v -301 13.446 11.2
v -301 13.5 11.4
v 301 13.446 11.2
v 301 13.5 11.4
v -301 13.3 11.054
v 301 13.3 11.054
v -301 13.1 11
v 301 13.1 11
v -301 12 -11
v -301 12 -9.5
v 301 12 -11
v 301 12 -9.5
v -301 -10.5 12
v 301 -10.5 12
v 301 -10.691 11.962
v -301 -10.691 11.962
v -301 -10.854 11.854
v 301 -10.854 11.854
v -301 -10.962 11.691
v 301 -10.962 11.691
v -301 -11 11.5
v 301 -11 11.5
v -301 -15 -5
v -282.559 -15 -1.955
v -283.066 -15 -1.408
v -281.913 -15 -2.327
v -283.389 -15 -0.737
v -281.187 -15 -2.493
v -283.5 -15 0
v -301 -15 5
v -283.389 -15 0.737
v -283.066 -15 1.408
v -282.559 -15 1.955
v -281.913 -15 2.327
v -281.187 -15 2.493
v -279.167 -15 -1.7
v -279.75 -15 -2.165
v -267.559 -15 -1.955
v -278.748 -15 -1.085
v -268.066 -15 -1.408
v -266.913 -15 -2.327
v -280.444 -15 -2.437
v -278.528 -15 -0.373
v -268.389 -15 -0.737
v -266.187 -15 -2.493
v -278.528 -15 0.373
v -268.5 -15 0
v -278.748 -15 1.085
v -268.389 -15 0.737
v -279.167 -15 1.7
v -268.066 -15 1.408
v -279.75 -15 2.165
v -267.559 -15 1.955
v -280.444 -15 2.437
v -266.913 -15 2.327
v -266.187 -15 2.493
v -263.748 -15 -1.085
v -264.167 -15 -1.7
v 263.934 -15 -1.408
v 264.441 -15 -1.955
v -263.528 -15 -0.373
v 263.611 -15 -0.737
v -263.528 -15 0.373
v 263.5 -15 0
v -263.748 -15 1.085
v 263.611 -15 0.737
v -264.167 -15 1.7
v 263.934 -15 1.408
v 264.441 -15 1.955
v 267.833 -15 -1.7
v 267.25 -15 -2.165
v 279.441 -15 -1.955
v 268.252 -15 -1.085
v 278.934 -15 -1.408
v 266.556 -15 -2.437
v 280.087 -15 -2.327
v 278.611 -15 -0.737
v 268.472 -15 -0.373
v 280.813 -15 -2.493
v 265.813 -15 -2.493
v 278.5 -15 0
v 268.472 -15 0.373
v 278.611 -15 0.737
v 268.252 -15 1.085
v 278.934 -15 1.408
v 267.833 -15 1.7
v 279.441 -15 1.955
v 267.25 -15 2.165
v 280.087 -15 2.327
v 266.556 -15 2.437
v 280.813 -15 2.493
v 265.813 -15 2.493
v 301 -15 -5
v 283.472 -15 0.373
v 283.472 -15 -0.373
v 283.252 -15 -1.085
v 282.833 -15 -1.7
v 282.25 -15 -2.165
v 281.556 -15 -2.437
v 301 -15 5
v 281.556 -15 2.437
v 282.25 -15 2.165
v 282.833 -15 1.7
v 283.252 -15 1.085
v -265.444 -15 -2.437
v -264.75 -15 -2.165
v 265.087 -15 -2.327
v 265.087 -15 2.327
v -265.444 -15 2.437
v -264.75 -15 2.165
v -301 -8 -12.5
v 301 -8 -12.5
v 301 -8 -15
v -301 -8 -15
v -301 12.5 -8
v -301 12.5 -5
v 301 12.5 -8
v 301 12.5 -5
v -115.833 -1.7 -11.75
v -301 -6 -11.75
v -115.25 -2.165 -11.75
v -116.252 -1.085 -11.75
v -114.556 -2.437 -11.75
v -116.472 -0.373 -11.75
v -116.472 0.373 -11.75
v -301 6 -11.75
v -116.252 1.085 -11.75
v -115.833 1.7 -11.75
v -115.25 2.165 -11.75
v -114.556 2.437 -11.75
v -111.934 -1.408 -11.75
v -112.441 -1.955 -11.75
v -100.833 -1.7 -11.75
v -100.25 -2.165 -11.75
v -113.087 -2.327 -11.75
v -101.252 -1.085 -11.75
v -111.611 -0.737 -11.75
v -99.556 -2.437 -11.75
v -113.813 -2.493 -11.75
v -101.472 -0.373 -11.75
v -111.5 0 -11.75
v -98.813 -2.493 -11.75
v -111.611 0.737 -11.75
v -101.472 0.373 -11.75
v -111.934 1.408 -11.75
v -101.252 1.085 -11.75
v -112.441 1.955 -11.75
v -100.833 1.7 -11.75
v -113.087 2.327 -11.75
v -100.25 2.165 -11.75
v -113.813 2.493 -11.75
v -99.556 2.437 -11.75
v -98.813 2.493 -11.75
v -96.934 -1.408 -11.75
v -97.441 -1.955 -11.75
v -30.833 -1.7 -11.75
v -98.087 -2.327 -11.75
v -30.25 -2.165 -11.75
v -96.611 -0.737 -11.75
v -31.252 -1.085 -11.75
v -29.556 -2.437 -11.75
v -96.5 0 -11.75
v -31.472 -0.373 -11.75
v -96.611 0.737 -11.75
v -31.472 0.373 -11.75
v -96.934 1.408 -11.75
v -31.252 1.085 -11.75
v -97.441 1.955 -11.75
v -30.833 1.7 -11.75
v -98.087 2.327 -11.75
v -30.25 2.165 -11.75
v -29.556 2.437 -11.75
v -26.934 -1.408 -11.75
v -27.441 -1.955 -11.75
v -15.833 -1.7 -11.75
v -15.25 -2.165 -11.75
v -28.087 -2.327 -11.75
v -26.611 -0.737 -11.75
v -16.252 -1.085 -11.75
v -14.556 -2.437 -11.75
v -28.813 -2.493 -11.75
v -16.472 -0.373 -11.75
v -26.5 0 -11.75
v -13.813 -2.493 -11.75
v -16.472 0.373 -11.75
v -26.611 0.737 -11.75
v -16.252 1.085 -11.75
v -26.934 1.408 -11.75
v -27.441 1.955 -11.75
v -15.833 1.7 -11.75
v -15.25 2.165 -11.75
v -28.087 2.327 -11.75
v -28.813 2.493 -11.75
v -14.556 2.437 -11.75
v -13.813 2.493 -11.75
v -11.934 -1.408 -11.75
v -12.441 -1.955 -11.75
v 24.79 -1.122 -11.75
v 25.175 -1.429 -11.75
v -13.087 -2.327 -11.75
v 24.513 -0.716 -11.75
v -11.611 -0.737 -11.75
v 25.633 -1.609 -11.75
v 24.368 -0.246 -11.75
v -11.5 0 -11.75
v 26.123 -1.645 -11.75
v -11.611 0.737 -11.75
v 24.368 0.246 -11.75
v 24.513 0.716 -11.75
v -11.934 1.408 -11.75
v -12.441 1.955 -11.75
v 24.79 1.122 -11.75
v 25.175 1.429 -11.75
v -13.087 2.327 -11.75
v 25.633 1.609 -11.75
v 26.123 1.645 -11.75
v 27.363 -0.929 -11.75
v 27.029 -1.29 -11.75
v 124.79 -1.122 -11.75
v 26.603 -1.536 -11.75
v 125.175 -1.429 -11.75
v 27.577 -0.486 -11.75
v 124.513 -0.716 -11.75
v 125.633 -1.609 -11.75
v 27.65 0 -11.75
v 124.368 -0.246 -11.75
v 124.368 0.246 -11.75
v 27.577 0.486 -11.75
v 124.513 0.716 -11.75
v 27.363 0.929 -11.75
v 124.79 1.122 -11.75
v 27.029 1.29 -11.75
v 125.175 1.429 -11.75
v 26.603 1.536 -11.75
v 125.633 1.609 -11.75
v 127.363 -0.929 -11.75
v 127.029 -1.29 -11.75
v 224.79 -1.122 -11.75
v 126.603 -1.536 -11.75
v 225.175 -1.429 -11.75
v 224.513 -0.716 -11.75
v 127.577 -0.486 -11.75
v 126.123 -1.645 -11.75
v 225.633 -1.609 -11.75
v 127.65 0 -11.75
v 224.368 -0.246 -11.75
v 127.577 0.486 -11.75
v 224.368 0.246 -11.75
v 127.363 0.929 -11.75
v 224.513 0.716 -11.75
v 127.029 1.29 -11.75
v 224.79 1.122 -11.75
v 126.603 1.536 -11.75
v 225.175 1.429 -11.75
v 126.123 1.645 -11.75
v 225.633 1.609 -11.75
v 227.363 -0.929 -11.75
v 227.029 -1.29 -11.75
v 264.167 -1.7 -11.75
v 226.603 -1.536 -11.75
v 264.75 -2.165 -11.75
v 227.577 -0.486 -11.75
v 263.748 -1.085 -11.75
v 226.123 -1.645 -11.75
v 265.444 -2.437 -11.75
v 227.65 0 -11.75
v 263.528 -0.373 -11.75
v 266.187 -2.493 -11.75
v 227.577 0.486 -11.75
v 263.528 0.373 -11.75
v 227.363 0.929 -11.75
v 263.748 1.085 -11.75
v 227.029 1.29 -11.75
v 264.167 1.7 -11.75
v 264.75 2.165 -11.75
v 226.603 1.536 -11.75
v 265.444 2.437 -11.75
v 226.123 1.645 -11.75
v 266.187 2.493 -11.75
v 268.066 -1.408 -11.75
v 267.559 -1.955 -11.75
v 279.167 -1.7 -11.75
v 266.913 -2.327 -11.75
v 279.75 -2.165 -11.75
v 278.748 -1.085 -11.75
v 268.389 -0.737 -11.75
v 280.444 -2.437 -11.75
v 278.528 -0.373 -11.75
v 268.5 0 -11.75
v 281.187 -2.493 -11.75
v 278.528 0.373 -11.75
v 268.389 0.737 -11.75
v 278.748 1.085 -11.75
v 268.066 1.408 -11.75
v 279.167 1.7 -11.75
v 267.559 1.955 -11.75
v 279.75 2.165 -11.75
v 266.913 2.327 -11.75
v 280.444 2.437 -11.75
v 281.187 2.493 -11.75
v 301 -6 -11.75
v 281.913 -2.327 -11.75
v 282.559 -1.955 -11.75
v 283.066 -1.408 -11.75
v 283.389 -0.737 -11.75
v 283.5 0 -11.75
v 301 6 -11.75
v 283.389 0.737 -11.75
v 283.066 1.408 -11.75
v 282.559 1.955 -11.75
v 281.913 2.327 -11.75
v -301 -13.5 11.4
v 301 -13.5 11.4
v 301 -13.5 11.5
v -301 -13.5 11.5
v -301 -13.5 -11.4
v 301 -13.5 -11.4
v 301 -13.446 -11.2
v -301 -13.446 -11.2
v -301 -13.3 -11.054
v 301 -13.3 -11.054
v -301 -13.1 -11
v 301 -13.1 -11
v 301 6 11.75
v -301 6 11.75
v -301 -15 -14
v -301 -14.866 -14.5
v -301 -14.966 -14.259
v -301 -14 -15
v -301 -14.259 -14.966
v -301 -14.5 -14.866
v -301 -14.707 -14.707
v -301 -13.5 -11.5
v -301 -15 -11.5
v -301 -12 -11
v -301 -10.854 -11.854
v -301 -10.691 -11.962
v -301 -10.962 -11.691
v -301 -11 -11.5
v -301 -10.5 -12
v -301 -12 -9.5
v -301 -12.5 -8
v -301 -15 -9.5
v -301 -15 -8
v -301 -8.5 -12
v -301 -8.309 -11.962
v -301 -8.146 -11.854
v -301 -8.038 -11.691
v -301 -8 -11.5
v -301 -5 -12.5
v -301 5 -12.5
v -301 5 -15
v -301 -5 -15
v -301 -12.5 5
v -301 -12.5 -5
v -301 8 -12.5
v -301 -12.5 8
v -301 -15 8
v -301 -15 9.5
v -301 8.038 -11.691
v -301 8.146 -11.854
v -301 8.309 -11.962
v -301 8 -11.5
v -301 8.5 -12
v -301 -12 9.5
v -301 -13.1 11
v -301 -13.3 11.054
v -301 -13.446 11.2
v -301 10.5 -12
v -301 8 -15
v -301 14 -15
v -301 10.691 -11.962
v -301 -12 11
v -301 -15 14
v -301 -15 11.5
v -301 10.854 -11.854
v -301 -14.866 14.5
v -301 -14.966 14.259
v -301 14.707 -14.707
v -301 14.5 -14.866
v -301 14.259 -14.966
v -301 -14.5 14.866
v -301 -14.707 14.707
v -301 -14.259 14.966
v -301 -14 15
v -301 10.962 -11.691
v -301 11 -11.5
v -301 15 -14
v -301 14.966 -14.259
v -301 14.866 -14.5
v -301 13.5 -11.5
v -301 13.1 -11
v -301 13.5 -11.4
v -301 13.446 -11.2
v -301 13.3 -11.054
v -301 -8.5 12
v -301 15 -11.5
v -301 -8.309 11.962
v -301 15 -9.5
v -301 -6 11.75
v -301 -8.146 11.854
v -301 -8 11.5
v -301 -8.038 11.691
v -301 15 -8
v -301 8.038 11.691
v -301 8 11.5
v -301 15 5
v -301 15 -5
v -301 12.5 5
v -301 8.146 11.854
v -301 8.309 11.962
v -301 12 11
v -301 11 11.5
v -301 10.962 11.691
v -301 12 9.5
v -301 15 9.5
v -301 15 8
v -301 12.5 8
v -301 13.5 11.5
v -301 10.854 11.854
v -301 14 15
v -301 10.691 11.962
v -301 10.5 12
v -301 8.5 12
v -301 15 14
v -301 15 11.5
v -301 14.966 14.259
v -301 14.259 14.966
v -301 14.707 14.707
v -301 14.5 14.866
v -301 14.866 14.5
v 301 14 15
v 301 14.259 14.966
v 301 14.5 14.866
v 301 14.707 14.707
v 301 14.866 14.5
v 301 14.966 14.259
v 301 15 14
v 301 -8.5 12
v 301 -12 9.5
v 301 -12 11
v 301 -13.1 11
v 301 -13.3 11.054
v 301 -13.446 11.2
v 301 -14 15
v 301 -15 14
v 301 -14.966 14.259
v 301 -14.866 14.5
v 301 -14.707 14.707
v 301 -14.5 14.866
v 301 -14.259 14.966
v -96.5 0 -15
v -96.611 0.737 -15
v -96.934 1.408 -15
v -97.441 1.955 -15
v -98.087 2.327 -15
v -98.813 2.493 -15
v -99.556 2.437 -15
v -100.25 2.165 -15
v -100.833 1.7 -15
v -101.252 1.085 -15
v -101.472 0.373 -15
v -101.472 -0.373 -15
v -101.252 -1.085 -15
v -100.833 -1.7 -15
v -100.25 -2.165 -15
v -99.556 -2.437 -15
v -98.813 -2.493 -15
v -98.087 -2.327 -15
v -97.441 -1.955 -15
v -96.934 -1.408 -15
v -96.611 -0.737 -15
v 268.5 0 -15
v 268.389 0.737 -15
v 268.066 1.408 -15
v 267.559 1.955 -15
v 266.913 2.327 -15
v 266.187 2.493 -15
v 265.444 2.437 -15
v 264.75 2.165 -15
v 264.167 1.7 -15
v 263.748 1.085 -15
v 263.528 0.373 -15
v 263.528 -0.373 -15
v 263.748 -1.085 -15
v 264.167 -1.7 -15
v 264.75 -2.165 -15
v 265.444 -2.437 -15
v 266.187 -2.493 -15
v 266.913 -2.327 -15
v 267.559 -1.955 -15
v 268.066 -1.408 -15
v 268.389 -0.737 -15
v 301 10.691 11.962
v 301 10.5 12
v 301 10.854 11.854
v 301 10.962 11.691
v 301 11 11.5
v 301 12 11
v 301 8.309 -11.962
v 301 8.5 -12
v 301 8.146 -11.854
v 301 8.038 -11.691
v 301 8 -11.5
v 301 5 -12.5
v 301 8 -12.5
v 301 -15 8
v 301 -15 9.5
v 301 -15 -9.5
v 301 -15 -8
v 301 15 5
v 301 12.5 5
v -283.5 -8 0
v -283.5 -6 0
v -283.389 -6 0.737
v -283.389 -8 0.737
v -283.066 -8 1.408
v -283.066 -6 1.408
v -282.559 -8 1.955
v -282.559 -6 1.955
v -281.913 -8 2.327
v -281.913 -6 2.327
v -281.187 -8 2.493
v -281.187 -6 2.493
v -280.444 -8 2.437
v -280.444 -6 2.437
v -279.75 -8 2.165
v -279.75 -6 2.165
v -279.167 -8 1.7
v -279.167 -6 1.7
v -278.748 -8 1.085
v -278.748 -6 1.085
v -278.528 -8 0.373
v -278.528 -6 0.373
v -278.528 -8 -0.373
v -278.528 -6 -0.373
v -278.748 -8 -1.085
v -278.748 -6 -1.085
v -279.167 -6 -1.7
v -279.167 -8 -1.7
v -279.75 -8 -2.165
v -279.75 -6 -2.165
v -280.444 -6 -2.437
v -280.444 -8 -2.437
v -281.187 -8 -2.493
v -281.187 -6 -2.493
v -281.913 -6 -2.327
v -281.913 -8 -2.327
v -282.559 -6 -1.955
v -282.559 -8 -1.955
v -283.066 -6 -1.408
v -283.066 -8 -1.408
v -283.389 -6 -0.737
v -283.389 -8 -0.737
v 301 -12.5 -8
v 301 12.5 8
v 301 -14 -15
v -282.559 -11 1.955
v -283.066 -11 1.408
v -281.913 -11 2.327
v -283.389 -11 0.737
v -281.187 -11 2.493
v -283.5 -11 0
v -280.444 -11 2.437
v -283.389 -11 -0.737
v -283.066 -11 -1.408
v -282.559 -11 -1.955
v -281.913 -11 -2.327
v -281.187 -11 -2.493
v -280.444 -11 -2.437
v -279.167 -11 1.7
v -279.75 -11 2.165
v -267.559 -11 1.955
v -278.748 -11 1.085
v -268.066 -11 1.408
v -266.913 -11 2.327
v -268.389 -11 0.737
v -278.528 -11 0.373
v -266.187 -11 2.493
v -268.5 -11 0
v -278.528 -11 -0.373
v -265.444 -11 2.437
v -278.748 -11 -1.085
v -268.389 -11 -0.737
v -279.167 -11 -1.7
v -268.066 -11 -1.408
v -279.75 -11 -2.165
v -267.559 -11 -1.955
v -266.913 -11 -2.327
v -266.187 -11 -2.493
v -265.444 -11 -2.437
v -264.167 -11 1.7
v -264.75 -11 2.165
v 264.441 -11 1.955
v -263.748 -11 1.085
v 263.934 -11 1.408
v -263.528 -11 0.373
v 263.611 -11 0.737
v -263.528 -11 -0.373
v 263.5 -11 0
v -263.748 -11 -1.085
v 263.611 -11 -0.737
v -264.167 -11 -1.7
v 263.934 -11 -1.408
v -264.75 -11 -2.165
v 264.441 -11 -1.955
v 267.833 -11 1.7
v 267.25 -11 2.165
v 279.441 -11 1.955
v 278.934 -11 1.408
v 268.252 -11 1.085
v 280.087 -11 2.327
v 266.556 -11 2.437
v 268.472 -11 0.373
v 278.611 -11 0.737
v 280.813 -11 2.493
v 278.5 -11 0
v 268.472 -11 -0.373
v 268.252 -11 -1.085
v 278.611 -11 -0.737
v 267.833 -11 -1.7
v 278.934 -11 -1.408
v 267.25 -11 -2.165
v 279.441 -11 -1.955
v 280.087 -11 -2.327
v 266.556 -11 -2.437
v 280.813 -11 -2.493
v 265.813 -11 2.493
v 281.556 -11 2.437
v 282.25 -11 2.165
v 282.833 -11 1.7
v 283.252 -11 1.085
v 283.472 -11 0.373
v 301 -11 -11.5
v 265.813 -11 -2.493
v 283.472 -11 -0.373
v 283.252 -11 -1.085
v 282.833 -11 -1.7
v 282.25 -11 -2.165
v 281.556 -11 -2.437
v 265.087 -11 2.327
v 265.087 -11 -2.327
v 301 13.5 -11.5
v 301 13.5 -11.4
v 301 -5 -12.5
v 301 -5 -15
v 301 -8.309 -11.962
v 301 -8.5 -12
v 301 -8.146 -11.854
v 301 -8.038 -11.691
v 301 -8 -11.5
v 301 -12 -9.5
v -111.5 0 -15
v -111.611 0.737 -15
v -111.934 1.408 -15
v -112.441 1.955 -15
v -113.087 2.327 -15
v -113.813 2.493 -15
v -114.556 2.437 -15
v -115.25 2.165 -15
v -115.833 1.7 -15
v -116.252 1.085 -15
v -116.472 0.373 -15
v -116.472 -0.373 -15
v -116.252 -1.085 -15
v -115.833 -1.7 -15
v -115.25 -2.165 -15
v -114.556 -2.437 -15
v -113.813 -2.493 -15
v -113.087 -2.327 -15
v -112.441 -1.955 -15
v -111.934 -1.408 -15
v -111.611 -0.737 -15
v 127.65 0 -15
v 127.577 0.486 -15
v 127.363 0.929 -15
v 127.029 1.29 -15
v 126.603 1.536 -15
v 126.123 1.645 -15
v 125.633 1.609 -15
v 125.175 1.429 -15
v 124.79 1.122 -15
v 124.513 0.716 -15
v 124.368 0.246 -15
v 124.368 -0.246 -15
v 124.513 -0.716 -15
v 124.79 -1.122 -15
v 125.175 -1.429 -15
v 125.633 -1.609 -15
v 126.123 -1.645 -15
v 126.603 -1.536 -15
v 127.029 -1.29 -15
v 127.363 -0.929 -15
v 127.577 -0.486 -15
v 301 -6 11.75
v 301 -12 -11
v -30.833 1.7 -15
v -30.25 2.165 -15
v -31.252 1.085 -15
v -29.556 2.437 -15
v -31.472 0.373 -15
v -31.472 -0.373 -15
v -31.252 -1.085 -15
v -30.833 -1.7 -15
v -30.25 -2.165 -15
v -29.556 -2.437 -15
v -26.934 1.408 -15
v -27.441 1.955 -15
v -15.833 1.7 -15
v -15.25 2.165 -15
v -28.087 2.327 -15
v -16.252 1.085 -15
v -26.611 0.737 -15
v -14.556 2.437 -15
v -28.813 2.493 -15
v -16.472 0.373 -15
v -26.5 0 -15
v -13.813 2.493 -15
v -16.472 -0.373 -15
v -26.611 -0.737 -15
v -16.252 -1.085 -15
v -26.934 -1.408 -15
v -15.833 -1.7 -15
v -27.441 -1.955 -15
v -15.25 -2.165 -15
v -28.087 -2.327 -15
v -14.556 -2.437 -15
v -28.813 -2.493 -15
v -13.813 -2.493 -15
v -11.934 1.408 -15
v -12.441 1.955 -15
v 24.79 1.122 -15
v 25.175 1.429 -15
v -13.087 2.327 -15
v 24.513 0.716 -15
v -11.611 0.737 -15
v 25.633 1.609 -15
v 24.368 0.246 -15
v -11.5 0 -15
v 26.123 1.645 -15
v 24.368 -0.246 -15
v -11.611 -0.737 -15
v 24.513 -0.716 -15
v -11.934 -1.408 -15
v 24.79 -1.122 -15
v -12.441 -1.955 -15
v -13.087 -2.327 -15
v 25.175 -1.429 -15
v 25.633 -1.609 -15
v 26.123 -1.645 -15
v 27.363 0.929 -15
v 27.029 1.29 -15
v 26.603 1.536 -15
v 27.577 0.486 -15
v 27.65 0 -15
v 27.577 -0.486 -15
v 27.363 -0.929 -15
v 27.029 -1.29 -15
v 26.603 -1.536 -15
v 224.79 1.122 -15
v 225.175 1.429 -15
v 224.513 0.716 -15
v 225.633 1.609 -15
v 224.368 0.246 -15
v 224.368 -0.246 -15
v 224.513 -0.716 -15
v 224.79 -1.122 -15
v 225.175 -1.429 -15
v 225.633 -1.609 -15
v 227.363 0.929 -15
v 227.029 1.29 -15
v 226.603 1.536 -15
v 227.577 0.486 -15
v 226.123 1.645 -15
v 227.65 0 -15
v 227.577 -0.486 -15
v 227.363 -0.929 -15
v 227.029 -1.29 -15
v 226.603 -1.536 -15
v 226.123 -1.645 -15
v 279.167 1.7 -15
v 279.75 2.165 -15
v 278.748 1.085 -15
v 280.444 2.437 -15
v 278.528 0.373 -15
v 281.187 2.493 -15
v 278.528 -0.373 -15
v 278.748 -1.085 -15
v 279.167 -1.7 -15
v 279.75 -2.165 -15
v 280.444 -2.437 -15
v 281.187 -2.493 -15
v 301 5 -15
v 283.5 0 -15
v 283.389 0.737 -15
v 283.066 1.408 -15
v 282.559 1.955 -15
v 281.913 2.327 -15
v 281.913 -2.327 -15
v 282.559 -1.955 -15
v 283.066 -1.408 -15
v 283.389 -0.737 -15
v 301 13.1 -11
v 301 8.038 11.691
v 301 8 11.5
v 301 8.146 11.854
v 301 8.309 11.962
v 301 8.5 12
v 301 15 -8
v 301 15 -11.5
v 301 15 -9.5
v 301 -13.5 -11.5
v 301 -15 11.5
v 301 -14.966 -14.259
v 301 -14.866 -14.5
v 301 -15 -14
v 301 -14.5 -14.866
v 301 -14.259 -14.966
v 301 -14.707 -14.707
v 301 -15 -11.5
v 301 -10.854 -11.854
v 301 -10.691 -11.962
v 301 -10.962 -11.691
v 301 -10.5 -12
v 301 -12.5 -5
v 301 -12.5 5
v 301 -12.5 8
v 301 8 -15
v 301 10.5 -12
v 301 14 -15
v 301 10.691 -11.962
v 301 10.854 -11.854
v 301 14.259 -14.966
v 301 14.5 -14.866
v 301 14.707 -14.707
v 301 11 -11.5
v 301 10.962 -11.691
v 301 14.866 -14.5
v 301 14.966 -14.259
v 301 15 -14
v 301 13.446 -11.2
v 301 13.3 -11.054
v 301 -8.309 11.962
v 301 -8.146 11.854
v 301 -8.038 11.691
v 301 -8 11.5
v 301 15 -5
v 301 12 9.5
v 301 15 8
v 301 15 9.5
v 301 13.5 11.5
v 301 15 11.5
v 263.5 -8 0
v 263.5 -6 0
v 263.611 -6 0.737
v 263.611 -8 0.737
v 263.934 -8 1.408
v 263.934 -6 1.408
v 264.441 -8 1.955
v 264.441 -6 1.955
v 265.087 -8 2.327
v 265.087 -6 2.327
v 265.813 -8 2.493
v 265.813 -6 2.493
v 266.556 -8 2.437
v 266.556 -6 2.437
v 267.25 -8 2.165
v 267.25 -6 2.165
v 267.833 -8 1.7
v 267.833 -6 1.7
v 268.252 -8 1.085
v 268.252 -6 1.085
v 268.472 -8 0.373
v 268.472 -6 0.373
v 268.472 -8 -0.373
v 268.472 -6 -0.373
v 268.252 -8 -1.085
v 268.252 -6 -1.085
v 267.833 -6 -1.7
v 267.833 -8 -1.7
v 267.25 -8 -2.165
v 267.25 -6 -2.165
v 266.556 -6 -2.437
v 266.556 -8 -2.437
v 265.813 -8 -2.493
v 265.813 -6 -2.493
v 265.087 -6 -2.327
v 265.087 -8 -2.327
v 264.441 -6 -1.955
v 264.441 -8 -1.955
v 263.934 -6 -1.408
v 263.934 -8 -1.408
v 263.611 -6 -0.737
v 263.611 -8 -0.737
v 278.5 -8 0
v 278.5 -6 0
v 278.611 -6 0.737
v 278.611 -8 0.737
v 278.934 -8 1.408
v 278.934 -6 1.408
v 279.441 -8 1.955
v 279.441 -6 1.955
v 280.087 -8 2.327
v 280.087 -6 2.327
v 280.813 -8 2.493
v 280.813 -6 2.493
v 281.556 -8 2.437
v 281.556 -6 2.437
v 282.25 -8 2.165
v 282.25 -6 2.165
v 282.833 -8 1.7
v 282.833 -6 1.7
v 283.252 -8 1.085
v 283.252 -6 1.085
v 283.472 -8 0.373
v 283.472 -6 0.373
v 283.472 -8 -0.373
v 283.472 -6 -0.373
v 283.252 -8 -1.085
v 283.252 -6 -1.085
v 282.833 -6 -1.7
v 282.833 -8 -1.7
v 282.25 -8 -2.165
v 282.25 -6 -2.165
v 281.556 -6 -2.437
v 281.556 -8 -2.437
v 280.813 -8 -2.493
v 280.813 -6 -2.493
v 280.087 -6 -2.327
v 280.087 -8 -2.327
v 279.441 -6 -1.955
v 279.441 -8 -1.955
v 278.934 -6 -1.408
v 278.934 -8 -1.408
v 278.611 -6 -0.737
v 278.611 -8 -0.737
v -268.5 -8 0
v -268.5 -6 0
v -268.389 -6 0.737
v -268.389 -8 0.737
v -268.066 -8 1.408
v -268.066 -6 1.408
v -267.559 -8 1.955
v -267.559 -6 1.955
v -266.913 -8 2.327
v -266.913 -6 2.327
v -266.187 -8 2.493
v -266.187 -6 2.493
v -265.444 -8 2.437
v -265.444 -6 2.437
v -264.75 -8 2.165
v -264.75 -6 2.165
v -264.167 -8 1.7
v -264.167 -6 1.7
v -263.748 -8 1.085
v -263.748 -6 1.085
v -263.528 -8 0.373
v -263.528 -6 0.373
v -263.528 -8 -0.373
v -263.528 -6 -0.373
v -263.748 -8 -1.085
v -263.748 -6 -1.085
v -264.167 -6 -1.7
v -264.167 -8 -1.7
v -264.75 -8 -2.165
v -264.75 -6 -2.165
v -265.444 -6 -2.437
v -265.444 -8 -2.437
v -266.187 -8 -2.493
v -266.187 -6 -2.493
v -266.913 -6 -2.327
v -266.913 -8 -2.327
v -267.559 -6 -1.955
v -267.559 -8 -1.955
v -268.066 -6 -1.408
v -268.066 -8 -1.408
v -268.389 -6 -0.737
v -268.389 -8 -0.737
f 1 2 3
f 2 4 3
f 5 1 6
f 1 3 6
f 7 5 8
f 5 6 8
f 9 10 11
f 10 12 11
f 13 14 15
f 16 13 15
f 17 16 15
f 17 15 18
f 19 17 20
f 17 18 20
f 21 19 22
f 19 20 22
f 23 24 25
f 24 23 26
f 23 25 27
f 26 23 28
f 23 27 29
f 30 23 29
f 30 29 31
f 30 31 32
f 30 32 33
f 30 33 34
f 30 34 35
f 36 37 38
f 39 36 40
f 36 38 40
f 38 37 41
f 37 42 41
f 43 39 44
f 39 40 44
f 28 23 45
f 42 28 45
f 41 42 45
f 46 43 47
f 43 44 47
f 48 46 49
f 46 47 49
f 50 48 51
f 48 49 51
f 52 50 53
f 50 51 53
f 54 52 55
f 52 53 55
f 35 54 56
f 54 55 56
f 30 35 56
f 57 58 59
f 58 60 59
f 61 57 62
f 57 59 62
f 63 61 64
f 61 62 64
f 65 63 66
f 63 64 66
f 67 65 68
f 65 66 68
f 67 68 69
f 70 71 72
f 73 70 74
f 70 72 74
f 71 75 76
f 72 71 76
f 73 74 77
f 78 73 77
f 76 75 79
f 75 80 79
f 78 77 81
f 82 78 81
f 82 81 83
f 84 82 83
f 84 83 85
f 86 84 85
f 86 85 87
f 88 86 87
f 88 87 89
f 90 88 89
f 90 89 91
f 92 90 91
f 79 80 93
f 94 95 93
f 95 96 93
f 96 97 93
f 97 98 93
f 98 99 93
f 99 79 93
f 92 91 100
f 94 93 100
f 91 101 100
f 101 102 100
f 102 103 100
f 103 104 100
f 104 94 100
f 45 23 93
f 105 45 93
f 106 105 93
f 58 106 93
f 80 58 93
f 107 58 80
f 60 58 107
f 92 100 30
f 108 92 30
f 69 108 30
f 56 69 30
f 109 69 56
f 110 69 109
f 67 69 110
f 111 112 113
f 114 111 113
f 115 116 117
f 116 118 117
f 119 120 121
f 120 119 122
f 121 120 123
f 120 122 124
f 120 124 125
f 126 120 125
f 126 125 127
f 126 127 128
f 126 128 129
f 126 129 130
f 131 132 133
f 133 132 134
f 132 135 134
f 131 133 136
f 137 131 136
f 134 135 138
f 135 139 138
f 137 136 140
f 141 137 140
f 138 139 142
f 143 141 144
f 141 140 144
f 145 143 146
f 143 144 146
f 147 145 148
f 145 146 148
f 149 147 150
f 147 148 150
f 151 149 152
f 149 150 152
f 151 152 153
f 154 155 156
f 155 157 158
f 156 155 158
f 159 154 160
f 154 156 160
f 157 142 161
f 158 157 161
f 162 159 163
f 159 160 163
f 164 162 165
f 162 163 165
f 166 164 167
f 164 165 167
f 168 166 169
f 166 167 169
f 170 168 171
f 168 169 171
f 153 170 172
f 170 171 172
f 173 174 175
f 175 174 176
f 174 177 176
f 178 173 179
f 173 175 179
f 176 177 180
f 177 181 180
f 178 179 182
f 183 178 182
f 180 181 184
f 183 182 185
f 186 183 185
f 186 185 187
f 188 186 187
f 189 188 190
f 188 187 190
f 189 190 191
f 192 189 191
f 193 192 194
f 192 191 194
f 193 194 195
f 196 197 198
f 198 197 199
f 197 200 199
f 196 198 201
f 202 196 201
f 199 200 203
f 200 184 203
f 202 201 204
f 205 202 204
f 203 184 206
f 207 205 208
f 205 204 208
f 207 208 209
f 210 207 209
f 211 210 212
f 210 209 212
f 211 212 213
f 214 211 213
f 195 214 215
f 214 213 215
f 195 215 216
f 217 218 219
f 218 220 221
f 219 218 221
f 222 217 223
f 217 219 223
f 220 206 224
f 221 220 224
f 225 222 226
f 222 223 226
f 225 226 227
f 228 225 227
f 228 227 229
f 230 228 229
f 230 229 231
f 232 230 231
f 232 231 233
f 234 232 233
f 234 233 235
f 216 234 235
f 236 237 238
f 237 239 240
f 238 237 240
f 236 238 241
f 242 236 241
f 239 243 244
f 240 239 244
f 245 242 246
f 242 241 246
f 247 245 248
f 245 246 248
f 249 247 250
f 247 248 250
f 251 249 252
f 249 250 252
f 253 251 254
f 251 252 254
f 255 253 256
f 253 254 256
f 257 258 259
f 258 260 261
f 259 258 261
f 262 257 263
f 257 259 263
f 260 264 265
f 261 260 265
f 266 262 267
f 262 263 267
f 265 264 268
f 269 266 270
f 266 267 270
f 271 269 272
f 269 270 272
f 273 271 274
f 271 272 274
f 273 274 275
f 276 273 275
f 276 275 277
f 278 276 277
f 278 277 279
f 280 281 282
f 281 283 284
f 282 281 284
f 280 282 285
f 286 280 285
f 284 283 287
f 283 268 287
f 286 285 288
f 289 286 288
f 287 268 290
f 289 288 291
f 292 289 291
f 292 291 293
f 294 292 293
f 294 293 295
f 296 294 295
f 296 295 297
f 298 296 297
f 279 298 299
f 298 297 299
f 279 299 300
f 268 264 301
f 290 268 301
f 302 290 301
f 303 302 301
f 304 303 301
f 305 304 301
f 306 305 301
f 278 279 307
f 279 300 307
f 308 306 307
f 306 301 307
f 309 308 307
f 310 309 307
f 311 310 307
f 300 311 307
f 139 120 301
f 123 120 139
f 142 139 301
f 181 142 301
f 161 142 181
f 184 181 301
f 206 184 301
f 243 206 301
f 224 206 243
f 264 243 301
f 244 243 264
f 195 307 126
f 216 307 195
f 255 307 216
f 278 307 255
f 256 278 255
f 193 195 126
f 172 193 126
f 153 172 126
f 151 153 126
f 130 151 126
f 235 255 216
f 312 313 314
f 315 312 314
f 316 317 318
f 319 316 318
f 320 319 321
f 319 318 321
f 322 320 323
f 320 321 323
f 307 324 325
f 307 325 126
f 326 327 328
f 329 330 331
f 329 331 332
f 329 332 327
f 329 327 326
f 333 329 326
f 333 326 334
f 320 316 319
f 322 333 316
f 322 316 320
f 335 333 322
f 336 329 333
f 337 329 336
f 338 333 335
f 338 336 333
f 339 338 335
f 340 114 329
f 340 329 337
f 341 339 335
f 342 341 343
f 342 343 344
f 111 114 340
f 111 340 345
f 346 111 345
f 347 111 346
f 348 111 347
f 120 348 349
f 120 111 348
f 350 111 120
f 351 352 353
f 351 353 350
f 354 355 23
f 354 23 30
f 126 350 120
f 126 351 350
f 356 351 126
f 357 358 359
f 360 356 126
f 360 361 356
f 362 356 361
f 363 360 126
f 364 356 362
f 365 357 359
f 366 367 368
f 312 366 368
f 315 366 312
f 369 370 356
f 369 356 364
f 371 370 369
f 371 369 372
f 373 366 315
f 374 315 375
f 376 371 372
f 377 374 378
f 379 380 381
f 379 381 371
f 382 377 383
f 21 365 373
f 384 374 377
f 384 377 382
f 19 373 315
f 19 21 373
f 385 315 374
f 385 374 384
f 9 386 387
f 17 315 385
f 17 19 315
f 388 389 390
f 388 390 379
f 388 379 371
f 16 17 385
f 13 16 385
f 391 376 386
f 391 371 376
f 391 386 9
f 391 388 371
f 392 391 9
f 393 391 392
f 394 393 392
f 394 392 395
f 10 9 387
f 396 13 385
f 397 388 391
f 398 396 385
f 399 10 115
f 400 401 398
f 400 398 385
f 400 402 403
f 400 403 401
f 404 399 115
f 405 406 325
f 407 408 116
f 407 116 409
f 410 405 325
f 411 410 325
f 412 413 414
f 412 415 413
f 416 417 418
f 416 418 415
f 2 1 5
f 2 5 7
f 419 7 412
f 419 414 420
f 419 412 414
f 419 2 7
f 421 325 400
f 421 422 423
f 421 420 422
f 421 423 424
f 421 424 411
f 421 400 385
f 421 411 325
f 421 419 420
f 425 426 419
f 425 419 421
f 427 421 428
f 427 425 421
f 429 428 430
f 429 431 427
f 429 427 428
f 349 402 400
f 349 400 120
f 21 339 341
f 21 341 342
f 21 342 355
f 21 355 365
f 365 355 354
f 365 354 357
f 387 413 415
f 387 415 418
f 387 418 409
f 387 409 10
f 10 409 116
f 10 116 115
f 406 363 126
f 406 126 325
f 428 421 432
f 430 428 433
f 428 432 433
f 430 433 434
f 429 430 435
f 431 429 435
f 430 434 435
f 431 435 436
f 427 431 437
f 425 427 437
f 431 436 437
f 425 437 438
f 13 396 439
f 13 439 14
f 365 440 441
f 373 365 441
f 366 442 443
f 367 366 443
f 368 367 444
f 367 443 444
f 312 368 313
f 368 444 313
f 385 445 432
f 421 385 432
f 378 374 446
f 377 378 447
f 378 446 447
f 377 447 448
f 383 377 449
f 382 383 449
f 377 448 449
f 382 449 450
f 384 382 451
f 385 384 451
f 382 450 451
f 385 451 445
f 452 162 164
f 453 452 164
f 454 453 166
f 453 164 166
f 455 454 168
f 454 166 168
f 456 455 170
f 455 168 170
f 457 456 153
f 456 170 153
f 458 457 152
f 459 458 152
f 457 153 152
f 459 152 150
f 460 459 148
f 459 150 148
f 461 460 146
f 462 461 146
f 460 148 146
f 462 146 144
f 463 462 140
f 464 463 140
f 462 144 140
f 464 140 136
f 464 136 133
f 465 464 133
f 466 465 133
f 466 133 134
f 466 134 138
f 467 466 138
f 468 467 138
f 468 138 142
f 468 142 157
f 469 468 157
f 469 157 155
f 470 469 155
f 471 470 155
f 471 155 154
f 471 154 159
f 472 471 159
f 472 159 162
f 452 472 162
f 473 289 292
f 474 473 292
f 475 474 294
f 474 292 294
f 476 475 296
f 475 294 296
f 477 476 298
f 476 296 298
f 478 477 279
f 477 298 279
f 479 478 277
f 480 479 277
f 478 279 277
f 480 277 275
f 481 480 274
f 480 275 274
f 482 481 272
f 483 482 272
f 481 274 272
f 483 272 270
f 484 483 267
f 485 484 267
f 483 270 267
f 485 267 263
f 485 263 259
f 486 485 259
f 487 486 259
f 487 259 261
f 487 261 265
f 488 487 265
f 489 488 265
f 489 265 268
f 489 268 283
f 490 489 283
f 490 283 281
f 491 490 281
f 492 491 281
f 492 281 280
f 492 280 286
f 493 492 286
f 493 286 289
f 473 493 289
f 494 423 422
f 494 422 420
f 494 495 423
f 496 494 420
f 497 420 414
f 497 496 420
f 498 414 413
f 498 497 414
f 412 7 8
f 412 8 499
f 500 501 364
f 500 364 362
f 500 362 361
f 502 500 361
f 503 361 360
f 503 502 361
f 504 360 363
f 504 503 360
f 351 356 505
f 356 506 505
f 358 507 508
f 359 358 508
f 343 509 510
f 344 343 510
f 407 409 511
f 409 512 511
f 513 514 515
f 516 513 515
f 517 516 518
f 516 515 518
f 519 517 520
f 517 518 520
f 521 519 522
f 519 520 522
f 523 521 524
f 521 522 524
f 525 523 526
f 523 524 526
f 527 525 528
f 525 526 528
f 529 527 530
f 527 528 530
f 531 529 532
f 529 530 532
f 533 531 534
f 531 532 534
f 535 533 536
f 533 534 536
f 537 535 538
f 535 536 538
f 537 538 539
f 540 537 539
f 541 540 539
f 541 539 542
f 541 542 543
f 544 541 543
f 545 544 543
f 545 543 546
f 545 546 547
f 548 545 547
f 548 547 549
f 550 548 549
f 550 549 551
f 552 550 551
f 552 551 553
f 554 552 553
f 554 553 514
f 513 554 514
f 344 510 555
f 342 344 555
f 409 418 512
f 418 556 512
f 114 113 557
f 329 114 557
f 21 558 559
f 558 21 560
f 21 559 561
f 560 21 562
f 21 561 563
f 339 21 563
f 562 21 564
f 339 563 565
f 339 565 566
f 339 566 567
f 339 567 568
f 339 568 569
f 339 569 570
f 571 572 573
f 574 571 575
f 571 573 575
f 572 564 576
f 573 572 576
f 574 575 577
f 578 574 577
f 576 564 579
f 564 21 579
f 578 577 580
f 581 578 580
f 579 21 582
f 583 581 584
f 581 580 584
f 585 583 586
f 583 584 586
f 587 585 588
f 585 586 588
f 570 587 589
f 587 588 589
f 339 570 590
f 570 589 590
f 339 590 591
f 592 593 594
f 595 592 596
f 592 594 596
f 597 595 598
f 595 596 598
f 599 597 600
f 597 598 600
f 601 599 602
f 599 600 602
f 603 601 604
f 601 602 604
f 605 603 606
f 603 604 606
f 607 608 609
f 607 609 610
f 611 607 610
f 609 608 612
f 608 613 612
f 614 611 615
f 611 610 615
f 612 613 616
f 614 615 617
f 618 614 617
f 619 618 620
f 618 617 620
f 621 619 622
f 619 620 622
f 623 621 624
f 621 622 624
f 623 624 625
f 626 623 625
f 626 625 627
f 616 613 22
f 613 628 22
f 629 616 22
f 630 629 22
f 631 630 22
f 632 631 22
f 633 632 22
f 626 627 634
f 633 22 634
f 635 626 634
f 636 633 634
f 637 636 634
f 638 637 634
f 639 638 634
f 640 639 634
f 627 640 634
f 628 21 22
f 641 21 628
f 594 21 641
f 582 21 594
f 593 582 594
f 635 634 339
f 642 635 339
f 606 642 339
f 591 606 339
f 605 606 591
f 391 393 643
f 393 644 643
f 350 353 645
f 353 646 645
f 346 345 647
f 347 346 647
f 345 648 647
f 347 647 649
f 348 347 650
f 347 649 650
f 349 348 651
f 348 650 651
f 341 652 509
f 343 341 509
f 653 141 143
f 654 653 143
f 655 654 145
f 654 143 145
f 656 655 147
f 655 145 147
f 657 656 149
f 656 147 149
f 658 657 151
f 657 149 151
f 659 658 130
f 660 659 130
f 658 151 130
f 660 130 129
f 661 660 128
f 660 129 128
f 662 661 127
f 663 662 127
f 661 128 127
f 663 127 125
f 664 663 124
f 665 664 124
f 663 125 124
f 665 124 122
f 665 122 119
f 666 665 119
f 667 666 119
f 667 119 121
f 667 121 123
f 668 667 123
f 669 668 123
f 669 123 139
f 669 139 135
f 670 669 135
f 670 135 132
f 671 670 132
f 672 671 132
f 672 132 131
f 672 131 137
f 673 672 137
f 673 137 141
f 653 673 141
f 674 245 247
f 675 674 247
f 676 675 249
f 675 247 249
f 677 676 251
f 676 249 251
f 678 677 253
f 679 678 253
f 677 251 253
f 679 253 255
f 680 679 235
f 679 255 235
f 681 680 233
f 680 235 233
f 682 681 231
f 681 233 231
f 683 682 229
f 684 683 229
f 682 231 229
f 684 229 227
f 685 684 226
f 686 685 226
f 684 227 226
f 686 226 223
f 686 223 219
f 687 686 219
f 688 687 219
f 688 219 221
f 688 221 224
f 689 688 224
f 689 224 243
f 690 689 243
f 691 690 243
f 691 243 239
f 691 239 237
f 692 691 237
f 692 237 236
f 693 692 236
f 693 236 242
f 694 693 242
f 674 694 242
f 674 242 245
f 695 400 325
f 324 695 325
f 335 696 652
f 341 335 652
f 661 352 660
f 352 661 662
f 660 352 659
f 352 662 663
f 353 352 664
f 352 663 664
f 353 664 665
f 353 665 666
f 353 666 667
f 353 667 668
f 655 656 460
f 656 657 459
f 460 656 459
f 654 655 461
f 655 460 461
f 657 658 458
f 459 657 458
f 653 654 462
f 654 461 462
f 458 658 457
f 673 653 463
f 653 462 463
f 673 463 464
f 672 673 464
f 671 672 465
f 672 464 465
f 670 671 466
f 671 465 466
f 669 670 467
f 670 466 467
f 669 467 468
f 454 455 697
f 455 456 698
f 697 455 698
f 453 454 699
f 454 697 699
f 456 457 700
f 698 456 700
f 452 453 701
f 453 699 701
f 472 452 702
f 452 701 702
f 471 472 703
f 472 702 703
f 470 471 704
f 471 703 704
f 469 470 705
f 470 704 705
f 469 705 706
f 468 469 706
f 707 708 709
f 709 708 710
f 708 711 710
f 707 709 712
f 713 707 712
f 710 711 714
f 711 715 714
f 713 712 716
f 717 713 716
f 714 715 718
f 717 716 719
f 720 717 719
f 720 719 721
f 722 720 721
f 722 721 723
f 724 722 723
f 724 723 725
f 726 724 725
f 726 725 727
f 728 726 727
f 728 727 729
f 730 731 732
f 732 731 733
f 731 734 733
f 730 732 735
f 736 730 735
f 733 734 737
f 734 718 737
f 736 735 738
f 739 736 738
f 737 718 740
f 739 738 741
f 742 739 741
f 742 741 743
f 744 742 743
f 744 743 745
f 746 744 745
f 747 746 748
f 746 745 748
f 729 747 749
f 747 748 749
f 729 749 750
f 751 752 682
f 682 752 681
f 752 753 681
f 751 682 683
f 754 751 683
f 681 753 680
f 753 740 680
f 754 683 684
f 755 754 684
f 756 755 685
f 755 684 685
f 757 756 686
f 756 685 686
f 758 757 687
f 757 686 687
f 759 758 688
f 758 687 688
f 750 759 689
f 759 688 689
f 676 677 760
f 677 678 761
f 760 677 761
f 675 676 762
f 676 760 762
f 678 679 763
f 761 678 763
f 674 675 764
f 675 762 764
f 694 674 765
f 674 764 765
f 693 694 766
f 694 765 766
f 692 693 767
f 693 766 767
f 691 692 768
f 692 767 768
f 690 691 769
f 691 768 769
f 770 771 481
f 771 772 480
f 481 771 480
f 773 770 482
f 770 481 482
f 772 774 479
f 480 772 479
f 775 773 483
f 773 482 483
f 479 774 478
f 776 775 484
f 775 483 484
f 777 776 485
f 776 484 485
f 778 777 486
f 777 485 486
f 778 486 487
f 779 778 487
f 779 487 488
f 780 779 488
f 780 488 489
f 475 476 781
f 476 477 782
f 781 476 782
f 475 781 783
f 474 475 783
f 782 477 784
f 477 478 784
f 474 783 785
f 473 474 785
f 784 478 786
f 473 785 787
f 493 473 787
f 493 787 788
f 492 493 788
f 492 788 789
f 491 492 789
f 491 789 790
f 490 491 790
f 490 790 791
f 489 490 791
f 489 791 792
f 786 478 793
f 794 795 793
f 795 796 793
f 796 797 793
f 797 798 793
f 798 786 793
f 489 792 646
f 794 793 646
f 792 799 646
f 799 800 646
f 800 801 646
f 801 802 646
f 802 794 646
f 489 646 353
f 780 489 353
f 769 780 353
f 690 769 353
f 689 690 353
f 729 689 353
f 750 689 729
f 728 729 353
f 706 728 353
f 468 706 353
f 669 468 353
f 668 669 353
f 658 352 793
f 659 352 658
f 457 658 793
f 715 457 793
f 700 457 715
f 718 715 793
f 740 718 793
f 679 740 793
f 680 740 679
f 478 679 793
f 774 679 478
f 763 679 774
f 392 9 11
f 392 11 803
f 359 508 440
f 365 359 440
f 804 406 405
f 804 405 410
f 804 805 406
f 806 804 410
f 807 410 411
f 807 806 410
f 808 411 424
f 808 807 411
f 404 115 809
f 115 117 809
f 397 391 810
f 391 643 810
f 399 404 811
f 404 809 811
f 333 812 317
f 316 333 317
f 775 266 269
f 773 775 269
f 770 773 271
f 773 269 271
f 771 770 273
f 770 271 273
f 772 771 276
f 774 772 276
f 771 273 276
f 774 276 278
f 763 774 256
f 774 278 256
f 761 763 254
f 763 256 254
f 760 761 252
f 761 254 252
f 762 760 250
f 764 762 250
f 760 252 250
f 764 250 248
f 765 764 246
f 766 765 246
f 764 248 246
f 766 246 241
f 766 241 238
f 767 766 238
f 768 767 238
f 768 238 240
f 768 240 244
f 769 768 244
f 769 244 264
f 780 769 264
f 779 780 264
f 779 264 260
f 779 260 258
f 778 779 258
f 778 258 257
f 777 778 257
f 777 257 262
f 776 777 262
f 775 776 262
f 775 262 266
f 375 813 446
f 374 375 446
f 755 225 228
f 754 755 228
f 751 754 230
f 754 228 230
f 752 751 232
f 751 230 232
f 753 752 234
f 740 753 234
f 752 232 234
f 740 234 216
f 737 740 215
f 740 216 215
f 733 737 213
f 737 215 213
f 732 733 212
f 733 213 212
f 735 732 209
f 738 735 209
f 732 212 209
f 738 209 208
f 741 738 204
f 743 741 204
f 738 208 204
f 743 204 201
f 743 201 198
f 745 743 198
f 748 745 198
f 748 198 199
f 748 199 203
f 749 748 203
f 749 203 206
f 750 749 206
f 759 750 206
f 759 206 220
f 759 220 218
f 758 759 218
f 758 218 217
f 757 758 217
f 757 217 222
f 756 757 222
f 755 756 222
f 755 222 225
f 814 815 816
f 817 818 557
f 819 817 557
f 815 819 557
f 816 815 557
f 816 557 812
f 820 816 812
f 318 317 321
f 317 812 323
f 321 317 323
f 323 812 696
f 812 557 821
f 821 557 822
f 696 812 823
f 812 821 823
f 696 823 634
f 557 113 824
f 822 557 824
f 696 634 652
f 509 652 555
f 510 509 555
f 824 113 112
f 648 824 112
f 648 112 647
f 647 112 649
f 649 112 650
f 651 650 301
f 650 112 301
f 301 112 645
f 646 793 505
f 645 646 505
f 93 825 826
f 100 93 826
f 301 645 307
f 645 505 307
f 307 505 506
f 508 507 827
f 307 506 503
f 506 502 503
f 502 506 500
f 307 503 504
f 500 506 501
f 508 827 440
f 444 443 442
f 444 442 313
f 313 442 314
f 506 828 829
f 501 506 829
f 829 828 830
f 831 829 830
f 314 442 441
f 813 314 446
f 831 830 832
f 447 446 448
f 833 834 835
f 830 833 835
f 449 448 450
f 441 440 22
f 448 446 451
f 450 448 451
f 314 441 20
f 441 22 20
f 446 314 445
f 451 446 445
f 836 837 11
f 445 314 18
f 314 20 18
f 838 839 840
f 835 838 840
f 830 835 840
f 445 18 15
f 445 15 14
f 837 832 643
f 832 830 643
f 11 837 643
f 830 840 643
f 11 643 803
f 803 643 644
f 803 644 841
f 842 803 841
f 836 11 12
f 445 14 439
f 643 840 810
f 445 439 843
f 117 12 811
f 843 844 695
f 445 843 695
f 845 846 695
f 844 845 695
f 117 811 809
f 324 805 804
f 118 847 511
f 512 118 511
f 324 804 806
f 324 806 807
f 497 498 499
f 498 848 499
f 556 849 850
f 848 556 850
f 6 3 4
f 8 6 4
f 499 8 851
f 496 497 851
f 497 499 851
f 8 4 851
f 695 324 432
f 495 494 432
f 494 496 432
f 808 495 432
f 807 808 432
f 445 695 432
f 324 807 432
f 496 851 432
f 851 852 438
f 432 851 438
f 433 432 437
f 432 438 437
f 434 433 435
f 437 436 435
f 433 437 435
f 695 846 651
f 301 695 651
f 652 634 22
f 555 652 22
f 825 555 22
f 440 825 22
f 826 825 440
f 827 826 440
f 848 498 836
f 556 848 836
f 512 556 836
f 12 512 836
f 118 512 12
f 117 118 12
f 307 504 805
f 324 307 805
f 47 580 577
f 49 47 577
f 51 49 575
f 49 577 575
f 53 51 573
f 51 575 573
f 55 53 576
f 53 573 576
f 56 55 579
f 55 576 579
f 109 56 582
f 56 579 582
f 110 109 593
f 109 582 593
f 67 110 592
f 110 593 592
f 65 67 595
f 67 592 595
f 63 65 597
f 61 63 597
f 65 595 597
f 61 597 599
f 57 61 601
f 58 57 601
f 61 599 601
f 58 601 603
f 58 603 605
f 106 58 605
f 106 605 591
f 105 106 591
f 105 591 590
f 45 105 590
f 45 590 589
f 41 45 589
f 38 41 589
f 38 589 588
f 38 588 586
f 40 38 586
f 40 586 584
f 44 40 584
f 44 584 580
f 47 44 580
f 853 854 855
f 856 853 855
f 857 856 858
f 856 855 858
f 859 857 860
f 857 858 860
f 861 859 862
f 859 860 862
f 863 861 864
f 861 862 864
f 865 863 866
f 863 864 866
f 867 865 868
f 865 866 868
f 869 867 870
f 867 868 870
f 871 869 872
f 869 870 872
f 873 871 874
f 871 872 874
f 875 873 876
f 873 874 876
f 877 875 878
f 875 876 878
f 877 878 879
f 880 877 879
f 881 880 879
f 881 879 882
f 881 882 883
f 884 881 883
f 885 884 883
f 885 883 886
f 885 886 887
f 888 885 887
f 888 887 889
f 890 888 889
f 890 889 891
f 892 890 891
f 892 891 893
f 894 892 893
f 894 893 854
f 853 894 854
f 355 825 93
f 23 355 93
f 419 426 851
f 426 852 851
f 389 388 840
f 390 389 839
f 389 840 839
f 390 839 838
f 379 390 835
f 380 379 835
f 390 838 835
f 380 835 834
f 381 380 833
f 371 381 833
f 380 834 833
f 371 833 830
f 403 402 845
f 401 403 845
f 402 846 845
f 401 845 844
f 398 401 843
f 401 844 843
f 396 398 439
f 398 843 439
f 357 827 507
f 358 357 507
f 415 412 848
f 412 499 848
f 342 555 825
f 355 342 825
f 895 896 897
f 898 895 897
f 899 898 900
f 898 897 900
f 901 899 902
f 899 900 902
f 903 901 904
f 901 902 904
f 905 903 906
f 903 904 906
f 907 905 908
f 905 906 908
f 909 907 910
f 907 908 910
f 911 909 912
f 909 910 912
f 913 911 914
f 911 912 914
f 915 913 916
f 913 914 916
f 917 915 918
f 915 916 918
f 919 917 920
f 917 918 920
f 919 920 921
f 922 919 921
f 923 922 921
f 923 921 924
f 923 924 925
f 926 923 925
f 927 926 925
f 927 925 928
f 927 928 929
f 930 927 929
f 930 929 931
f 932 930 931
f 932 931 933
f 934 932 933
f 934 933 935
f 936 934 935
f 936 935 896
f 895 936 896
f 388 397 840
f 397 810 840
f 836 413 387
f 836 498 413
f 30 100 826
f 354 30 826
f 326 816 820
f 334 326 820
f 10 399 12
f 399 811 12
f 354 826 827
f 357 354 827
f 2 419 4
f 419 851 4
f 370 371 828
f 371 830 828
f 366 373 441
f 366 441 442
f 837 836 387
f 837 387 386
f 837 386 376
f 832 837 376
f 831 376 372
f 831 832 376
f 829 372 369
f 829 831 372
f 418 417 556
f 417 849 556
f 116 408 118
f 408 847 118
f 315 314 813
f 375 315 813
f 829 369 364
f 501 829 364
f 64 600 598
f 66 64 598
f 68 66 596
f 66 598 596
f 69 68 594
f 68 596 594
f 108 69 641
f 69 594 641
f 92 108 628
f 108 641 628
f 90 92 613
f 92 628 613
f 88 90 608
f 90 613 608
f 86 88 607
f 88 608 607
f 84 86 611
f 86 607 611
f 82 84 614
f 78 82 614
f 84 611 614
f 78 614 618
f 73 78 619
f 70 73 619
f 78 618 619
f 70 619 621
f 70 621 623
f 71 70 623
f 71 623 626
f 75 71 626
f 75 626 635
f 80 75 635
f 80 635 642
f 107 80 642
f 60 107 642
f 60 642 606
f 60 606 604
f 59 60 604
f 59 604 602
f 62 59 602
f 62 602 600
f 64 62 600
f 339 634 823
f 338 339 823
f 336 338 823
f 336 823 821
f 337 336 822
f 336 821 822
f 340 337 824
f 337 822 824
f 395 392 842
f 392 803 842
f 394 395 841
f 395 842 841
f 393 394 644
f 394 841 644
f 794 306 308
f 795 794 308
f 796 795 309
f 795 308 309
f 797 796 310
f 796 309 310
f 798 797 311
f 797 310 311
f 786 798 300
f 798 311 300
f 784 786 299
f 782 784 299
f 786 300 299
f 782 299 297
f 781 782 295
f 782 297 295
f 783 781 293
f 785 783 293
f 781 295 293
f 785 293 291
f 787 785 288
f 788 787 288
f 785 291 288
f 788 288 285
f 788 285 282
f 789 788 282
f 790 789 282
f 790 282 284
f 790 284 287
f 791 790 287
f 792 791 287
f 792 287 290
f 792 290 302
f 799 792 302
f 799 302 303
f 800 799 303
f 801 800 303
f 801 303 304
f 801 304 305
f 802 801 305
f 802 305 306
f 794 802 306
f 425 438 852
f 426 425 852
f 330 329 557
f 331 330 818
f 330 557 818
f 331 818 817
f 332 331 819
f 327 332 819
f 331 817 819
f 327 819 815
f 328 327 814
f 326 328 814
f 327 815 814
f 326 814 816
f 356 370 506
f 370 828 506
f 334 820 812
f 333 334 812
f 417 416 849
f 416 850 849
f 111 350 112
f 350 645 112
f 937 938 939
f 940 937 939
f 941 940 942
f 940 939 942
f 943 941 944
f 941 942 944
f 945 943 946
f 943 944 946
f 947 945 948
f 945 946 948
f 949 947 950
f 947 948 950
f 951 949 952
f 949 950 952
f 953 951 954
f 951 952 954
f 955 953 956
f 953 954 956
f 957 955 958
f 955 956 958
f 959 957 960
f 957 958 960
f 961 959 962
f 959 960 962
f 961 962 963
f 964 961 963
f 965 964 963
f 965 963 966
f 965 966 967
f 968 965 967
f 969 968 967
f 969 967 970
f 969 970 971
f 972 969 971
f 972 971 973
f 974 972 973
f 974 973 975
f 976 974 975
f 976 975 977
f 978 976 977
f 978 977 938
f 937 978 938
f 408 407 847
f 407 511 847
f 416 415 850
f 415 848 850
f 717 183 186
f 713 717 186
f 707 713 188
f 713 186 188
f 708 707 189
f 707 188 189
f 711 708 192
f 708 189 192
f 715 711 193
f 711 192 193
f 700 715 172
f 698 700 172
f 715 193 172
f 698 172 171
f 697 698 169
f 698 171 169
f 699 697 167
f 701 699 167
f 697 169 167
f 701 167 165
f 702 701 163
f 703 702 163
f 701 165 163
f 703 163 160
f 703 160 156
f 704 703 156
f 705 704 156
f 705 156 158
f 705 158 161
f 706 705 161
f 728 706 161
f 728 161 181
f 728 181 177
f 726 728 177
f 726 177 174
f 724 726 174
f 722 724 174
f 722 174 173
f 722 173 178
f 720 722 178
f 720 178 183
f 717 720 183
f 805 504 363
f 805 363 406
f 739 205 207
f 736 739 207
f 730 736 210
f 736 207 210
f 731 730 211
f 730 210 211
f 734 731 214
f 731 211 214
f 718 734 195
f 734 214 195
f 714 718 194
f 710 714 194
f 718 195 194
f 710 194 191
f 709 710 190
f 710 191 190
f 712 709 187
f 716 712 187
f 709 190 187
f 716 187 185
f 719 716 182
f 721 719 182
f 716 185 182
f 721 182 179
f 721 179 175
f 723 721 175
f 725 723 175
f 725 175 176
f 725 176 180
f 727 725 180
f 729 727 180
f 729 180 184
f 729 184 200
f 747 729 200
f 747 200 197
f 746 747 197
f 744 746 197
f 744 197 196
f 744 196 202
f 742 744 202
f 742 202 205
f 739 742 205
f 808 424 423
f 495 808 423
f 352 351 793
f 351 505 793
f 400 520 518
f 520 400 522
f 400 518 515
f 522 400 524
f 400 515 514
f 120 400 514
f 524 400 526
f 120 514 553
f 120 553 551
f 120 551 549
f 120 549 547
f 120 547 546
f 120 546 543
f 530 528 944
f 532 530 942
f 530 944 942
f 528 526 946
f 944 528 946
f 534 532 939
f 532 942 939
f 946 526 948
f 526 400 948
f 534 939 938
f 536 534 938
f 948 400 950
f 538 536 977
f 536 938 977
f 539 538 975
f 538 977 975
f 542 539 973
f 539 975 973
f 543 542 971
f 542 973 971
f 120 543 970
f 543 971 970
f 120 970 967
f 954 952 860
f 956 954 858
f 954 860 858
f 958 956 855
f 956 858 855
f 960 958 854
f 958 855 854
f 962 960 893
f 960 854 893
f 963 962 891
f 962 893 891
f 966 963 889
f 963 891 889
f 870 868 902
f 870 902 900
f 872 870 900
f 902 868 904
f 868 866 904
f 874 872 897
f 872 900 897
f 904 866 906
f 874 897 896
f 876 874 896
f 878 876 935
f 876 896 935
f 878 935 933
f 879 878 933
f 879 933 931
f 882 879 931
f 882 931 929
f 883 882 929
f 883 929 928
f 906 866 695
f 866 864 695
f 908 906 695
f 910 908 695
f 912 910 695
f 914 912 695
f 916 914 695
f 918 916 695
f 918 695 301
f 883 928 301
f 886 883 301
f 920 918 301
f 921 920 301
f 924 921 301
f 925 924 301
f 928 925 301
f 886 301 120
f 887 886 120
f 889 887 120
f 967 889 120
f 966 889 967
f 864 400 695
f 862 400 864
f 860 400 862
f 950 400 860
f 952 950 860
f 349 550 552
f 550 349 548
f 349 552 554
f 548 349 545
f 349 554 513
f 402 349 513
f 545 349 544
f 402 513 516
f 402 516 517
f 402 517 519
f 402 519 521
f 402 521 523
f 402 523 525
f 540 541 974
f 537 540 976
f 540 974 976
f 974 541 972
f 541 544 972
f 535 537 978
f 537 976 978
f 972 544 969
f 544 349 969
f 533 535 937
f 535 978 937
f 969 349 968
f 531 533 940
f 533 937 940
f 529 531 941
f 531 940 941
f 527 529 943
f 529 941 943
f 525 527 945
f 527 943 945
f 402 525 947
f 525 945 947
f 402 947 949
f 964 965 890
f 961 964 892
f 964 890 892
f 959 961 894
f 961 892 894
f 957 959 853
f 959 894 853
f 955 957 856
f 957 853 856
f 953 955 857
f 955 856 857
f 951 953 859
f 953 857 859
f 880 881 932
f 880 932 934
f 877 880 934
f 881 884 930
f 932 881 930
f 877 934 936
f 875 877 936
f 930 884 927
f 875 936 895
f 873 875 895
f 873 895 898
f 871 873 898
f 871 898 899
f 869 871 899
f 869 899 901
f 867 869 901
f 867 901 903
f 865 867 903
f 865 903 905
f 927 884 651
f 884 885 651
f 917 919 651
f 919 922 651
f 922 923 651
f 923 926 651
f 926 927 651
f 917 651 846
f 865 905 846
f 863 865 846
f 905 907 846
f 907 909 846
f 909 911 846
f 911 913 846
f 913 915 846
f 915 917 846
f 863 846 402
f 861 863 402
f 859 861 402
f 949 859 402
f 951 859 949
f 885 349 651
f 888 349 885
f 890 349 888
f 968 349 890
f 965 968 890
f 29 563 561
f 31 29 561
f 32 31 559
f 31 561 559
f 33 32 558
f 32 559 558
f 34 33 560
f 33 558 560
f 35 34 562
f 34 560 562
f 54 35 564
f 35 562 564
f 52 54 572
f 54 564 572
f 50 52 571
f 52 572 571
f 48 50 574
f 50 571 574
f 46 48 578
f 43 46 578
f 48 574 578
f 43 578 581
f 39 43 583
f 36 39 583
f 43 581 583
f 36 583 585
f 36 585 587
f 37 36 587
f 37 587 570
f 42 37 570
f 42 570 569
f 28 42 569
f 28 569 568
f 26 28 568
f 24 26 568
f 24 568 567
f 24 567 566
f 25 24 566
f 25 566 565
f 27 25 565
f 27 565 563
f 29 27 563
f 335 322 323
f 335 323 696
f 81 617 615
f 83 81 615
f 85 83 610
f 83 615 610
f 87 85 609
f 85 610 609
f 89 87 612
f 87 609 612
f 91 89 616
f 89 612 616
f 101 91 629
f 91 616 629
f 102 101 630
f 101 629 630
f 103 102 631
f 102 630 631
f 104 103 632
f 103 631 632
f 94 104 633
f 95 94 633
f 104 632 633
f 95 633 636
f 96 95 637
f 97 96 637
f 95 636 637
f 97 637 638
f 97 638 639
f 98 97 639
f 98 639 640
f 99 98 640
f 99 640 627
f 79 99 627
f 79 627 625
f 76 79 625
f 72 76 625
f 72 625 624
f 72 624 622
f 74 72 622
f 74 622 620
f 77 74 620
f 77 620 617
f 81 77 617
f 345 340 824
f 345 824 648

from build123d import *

# Parameters (mm, degrees)
SKETCH_1_W             = 23.5
SKETCH_1_H             = 12
EXTRUDE_1_DEPTH        = 301
HOLE_WIZARD_M6_1_D     = 5
HOLE_WIZARD_M6_1_DEPTH = 15
HOLE_WIZARD_M6_1_TIP   = 1.502151548
HOLE_WIZARD_M6_2_D     = 5
HOLE_WIZARD_M6_2_DEPTH = 15
HOLE_WIZARD_M6_2_TIP   = 1.502151548
HOLE_WIZARD_M4_1_D     = 3.3
HOLE_WIZARD_M4_1_DEPTH = 10.1
HOLE_WIZARD_M4_1_TIP   = 0.991420021


with BuildPart() as part:
    # 草图1 → 凸台-拉伸1 (new, symmetric)
    with BuildSketch(Plane(origin=(0, 0, 0), x_dir=(0, 0, -1), z_dir=(1, 0, 0))):
        with BuildLine():
            Line((-14, 15), (-11.5, 15))
            Line((-11.5, 15), (-11.5, 13.5))
            Line((-11.5, 13.5), (-11.4, 13.5))
            ThreePointArc((-11.4, 13.5), (-11.117157288, 13.382842712), (-11, 13.1))
            Line((-11, 13.1), (-11, 12))
            Line((-11, 12), (-9.5, 12))
            Line((-9.5, 12), (-9.5, 15))
            Line((-9.5, 15), (-8, 15))
            Line((-8, 15), (-8, 12.5))
            Line((-8, 12.5), (-5, 12.5))
            Line((-5, 12.5), (-5, 15))
            Line((-5, 15), (5, 15))
            Line((5, 15), (5, 12.5))
            Line((5, 12.5), (8, 12.5))
            Line((8, 12.5), (8, 15))
            Line((8, 15), (9.5, 15))
            Line((9.5, 15), (9.5, 12))
            Line((9.5, 12), (11, 12))
            Line((11, 12), (11, 13.1))
            ThreePointArc((11, 13.1), (11.117157288, 13.382842712), (11.4, 13.5))
            Line((11.4, 13.5), (11.5, 13.5))
            Line((11.5, 13.5), (11.5, 15))
            Line((11.5, 15), (14, 15))
            ThreePointArc((14, 15), (14.707106781, 14.707106781), (15, 14))
            Line((15, 14), (15, 8))
            Line((15, 8), (12.5, 8))
            Line((12.5, 8), (12.5, 5))
            Line((12.5, 5), (15, 5))
            Line((15, 5), (15, -5))
            Line((15, -5), (12.5, -5))
            Line((12.5, -5), (12.5, -8))
            Line((12.5, -8), (15, -8))
            Line((15, -8), (15, -14))
            ThreePointArc((15, -14), (14.707106781, -14.707106781), (14, -15))
            Line((14, -15), (11.5, -15))
            Line((11.5, -15), (11.5, -13.5))
            Line((11.5, -13.5), (11.4, -13.5))
            ThreePointArc((11.4, -13.5), (11.117157288, -13.382842712), (11, -13.1))
            Line((11, -13.1), (11, -12))
            Line((11, -12), (9.5, -12))
            Line((9.5, -12), (9.5, -15))
            Line((9.5, -15), (8, -15))
            Line((8, -15), (8, -12.5))
            Line((8, -12.5), (5, -12.5))
            Line((5, -12.5), (5, -15))
            Line((5, -15), (-5, -15))
            Line((-5, -15), (-5, -12.5))
            Line((-5, -12.5), (-8, -12.5))
            Line((-8, -12.5), (-8, -15))
            Line((-8, -15), (-9.5, -15))
            Line((-9.5, -15), (-9.5, -12))
            Line((-9.5, -12), (-11, -12))
            Line((-11, -12), (-11, -13.1))
            ThreePointArc((-11, -13.1), (-11.117157288, -13.382842712), (-11.4, -13.5))
            Line((-11.4, -13.5), (-11.5, -13.5))
            Line((-11.5, -13.5), (-11.5, -15))
            Line((-11.5, -15), (-14, -15))
            ThreePointArc((-14, -15), (-14.707106781, -14.707106781), (-15, -14))
            Line((-15, -14), (-15, 14))
            ThreePointArc((-15, 14), (-14.707106781, 14.707106781), (-14, 15))
        make_face()
        with BuildLine():
            Line((12, -10.5), (12, -8.5))
            ThreePointArc((12, -8.5), (11.853553391, -8.146446609), (11.5, -8))
            Line((11.5, -8), (-11.5, -8))
            ThreePointArc((-11.5, -8), (-11.853553391, -8.146446609), (-12, -8.5))
            Line((-12, -8.5), (-12, -10.5))
            ThreePointArc((-12, -10.5), (-11.853553391, -10.853553391), (-11.5, -11))
            Line((-11.5, -11), (11.5, -11))
            ThreePointArc((11.5, -11), (11.853553391, -10.853553391), (12, -10.5))
        make_face(mode=Mode.SUBTRACT)
        with BuildLine():
            Line((-11.5, 11), (11.5, 11))
            ThreePointArc((11.5, 11), (11.853553391, 10.853553391), (12, 10.5))
            Line((12, 10.5), (12, 8.5))
            ThreePointArc((12, 8.5), (11.853553391, 8.146446609), (11.5, 8))
            Line((11.5, 8), (-11.5, 8))
            ThreePointArc((-11.5, 8), (-11.853553391, 8.146446609), (-12, 8.5))
            Line((-12, 8.5), (-12, 10.5))
            ThreePointArc((-12, 10.5), (-11.853553391, 10.853553391), (-11.5, 11))
        make_face(mode=Mode.SUBTRACT)
        Rectangle(SKETCH_1_W, SKETCH_1_H, mode=Mode.SUBTRACT)
    extrude(amount=EXTRUDE_1_DEPTH, both=True)

    # M6 螺纹孔1
    with Locations(Plane.XZ.offset(15)):
        with Locations((281, 0), (266, 0), (-281, 0), (-266, 0)):
            Hole(HOLE_WIZARD_M6_1_D / 2, depth=HOLE_WIZARD_M6_1_DEPTH)
            with Locations((0, 0, -(HOLE_WIZARD_M6_1_DEPTH + HOLE_WIZARD_M6_1_TIP / 2))):  # 118° drill point
                Cone(0, HOLE_WIZARD_M6_1_D / 2, HOLE_WIZARD_M6_1_TIP, mode=Mode.SUBTRACT)

    # M6 螺纹孔2
    with Locations(Plane(origin=(0, 0, -15), x_dir=(-1, 0, 0), z_dir=(0, 0, -1))):
        with Locations((-281, 0), (-266, 0), (14, 0), (29, 0), (99, 0), (114, 0)):
            Hole(HOLE_WIZARD_M6_2_D / 2, depth=HOLE_WIZARD_M6_2_DEPTH)
            with Locations((0, 0, -(HOLE_WIZARD_M6_2_DEPTH + HOLE_WIZARD_M6_2_TIP / 2))):  # 118° drill point
                Cone(0, HOLE_WIZARD_M6_2_D / 2, HOLE_WIZARD_M6_2_TIP, mode=Mode.SUBTRACT)

    # M4 螺纹孔1
    with Locations(Plane(origin=(0, 0, -15), x_dir=(-1, 0, 0), z_dir=(0, 0, -1))):
        with Locations((-226, 0), (-126, 0), (-26, 0)):
            Hole(HOLE_WIZARD_M4_1_D / 2, depth=HOLE_WIZARD_M4_1_DEPTH)
            with Locations((0, 0, -(HOLE_WIZARD_M4_1_DEPTH + HOLE_WIZARD_M4_1_TIP / 2))):  # 118° drill point
                Cone(0, HOLE_WIZARD_M4_1_D / 2, HOLE_WIZARD_M4_1_TIP, mode=Mode.SUBTRACT)


solid = part.part
